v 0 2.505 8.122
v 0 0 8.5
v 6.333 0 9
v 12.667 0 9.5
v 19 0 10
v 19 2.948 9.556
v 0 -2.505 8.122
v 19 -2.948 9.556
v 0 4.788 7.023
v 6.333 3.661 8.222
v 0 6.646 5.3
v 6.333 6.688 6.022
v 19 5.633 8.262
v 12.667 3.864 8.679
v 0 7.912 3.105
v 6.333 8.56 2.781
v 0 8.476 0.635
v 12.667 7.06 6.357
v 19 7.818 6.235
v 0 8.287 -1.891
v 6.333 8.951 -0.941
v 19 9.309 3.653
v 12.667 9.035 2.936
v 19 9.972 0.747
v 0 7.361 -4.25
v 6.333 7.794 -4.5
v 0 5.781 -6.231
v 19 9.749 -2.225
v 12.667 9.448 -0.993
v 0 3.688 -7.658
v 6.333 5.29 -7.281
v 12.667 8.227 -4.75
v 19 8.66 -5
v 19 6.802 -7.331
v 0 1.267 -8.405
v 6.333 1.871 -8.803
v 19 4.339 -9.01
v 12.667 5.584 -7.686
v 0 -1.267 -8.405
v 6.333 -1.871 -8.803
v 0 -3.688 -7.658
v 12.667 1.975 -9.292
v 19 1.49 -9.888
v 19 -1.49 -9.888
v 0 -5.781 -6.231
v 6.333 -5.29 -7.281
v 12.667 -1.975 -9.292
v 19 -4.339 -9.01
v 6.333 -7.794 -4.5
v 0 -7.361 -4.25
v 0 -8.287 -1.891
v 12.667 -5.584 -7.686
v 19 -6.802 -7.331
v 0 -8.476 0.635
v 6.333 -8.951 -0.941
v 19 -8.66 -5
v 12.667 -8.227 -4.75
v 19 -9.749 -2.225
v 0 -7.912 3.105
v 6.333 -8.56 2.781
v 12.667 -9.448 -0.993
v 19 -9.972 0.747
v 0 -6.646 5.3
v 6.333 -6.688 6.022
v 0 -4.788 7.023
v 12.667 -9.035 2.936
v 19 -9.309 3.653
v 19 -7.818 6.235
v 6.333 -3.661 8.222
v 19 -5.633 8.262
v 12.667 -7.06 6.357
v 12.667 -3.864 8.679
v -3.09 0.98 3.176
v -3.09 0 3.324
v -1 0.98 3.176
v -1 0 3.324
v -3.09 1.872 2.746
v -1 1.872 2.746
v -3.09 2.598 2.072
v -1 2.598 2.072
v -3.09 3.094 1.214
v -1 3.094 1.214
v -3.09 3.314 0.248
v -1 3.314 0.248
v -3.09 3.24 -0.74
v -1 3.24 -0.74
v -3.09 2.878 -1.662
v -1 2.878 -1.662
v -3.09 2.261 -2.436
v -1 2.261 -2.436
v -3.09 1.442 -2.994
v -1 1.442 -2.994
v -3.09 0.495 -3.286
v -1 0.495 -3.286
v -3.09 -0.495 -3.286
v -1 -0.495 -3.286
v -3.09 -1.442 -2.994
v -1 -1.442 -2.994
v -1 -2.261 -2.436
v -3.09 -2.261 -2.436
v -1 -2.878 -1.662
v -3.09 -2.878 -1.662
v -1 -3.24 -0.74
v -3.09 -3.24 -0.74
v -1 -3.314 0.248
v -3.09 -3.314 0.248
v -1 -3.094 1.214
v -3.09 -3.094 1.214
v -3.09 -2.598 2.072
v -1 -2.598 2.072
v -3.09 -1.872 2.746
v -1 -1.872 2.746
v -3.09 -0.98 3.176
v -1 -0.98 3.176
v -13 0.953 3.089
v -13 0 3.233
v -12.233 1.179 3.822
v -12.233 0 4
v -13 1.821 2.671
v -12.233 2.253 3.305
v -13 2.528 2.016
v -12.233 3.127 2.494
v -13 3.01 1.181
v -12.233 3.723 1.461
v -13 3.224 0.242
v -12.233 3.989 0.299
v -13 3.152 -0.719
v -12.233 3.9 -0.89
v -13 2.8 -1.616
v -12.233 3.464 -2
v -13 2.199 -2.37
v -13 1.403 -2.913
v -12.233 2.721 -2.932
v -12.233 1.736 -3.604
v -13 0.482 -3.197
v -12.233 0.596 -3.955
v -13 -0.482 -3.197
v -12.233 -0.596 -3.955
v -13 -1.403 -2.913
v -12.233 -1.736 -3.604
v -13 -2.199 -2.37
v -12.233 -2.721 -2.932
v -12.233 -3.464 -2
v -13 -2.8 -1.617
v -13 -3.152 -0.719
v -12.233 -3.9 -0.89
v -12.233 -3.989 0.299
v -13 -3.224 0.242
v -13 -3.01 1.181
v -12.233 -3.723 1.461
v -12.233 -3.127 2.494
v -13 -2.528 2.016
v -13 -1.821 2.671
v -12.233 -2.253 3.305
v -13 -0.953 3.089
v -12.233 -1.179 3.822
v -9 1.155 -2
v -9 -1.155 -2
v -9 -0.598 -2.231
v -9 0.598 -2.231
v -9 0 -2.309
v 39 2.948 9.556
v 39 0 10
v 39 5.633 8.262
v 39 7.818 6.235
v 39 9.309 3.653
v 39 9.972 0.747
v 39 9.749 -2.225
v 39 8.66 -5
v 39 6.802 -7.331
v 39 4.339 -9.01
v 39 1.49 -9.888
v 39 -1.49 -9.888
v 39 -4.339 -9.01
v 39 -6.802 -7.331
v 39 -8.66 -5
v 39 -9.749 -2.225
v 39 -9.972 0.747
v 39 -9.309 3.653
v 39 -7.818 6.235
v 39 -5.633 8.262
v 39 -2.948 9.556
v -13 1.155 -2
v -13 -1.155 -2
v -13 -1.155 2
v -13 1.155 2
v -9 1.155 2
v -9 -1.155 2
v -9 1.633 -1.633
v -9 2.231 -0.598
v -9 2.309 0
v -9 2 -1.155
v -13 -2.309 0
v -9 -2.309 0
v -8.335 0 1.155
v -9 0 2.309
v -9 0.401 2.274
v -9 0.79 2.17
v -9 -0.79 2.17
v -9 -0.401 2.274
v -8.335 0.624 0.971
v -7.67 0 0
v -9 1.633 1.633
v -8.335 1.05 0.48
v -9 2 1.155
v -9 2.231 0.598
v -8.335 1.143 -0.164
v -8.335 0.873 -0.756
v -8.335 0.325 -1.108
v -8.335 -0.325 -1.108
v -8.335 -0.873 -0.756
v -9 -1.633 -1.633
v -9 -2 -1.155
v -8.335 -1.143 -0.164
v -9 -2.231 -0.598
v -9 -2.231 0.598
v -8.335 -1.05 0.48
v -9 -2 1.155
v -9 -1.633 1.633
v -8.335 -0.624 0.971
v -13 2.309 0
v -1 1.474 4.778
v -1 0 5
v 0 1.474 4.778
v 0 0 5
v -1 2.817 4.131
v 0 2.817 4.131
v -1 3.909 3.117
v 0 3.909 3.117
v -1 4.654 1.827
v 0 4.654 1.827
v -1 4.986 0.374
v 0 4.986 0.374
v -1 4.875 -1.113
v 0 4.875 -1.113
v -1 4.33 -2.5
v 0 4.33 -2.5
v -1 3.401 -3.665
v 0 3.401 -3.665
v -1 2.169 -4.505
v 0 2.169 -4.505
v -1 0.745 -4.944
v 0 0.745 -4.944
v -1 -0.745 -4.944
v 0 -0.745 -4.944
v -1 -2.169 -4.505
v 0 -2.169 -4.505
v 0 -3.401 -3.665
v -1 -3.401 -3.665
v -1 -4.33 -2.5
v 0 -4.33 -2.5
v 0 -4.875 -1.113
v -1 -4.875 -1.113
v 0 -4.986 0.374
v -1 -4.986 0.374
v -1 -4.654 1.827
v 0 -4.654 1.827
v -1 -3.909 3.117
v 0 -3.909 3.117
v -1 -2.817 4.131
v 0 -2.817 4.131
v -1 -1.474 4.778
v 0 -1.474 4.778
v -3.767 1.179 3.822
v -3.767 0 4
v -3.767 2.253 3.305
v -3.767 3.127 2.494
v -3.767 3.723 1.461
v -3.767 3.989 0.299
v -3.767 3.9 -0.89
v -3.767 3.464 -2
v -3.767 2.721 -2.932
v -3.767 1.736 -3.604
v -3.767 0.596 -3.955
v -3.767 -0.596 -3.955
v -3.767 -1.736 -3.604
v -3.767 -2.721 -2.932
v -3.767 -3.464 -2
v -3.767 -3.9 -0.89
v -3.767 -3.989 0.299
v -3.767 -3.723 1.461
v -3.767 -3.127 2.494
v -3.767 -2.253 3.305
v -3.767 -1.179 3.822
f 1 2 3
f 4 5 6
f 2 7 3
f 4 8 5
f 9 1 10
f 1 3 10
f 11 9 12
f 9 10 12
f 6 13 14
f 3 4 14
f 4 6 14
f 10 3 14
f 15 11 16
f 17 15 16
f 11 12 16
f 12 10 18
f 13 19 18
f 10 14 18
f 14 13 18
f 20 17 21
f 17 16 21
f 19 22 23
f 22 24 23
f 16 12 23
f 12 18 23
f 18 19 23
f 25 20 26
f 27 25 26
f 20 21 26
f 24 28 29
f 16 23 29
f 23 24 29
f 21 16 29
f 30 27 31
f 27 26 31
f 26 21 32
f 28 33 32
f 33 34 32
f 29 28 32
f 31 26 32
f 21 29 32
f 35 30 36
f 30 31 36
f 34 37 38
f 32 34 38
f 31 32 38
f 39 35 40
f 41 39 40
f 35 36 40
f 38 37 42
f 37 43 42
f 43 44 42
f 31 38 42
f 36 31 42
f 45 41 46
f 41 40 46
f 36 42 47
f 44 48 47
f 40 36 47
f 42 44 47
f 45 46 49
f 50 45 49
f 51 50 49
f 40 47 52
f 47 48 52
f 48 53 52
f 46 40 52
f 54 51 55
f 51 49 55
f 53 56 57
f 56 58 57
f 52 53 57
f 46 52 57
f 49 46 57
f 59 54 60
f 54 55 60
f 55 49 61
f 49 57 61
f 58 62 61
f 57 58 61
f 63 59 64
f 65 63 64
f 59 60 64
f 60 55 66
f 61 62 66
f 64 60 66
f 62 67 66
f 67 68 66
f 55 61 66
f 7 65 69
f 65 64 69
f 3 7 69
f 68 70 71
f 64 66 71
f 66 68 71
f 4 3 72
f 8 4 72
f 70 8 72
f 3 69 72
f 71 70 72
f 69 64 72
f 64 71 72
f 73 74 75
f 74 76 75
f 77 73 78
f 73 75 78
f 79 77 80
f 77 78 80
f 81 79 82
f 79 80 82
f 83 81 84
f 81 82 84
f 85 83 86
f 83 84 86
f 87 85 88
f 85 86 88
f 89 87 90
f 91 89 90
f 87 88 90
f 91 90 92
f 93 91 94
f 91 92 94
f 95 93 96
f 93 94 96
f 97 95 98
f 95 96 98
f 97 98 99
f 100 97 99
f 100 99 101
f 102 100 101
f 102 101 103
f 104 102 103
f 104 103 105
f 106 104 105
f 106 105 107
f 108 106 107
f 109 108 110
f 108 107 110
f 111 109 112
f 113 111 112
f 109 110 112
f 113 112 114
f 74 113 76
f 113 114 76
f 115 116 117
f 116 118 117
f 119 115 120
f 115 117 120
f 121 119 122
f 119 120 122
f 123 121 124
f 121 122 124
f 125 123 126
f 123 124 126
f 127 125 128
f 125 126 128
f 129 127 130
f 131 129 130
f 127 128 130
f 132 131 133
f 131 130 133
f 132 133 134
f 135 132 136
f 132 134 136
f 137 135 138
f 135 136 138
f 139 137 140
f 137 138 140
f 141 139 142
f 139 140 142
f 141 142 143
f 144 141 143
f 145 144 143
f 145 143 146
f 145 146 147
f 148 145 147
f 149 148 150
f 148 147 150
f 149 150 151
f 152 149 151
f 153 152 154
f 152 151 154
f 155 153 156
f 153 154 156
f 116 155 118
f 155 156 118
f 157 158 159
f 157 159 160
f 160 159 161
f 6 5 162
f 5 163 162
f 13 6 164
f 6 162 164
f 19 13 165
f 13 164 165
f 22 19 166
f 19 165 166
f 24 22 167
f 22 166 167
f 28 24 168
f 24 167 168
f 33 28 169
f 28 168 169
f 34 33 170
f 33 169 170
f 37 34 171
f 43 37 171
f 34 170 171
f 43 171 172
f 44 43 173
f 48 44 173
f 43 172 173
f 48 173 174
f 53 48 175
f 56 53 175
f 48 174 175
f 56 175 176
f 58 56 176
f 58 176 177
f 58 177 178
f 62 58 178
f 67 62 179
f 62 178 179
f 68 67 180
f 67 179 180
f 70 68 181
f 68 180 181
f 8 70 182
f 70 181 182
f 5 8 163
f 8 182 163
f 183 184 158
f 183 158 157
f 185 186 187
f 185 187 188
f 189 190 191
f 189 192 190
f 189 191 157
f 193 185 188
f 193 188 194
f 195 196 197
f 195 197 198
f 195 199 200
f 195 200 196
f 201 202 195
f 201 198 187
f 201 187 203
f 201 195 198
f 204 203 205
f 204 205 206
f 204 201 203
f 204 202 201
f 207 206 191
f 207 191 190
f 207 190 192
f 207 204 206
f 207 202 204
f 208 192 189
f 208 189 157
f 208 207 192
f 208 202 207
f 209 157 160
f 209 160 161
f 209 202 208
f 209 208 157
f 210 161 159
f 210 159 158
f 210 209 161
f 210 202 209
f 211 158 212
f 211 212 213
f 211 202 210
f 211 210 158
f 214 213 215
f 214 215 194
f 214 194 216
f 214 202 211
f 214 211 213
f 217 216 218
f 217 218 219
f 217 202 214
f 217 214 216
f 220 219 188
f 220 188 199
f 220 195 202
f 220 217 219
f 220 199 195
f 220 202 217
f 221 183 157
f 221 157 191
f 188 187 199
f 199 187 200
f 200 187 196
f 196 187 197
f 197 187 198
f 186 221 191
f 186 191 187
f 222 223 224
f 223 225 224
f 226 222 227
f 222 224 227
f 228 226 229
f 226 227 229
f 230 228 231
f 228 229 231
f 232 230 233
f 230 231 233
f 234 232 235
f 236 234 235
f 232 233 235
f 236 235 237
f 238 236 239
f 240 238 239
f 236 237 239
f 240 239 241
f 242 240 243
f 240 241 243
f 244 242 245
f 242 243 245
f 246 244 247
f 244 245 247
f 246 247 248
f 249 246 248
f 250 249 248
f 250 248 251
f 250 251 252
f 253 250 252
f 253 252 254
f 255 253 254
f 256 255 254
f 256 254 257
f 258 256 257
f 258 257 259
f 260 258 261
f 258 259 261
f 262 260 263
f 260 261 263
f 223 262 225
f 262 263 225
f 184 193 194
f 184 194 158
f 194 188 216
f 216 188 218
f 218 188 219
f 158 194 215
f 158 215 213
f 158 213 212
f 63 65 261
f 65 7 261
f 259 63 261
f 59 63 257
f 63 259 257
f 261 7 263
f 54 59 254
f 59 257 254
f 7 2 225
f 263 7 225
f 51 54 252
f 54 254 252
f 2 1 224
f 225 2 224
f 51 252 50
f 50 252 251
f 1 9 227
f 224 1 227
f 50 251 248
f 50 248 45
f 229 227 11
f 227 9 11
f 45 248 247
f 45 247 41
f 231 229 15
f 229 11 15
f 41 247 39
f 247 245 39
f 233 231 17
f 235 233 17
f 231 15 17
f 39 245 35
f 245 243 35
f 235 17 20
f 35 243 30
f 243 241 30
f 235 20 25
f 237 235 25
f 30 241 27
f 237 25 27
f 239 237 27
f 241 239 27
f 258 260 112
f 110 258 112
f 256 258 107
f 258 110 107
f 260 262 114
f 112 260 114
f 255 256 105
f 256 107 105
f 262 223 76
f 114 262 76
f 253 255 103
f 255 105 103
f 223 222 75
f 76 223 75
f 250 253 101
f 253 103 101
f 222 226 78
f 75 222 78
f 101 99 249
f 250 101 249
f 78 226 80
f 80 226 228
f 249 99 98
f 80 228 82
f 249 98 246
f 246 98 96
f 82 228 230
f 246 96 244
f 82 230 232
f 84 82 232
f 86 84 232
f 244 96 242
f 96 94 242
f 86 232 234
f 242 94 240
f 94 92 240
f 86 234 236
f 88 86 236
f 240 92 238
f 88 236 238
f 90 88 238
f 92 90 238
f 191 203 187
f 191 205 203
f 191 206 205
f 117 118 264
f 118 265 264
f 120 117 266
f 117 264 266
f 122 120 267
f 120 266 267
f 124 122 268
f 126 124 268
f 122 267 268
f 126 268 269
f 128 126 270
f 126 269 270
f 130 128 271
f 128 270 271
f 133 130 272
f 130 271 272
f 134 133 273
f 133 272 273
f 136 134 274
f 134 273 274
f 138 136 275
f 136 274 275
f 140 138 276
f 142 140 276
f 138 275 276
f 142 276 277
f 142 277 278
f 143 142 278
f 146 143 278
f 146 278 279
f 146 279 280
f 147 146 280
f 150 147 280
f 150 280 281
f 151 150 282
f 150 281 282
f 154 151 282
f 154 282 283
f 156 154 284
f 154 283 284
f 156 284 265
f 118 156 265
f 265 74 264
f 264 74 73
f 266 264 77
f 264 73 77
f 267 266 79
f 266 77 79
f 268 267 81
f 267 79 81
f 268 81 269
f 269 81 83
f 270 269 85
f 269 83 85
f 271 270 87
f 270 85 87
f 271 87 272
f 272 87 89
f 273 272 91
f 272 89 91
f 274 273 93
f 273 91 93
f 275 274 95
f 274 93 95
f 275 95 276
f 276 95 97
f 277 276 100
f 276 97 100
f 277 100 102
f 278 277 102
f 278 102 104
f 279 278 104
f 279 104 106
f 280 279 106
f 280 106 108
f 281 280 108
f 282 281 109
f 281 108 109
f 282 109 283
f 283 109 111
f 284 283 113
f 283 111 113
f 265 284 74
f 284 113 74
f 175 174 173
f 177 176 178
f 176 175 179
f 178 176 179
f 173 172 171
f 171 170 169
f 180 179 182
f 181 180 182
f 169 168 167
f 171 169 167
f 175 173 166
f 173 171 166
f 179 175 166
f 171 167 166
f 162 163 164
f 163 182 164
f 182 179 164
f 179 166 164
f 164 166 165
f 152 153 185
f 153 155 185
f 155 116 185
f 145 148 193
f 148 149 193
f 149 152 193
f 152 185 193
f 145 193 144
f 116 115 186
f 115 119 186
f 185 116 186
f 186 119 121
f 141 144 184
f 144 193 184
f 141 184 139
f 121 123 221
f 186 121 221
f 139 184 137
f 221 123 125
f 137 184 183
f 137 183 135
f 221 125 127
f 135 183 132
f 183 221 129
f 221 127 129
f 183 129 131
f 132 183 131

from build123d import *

# Parameters (mm, degrees)
CUT_EXTRUDE_1_DEPTH = 4


with BuildPart() as part:
    # 草图1 → 旋转1 (revolve)
    with BuildSketch(Plane.XY):
        Polygon((-13, 0), (-13, 3.233), (-12.233, 4), (-3.767, 4), (-3.0905, 3.3235), (-1, 3.3235), (-1, 5), (0, 5), (0, 8.5), (19, 10), (39, 10), (39, 0), align=None)
    revolve(axis=Axis((39, 0, 0), (-1, 0, 0)))

    # 草图2 → 切除-拉伸1 (cut)
    with BuildSketch(Plane(origin=(-13, 0, 0), x_dir=(0, 0, -1), z_dir=(1, 0, 0))):
        Polygon((-2, 1.154700538), (-2, -1.154700538), (0, -2.309401077), (2, -1.154700538), (2, 1.154700538), (0, 2.309401077), align=None)
    extrude(amount=CUT_EXTRUDE_1_DEPTH, mode=Mode.SUBTRACT)

    # 草图3 → 切除-旋转1 (revolve, cut)
    with BuildSketch(Plane.XY):
        Polygon((-9, 0), (-9, 2.309401077), (-7.67, 0), align=None)
    revolve(axis=Axis((-7.67, 0, 0), (-1, 0, 0)), mode=Mode.SUBTRACT)


solid = part.part
